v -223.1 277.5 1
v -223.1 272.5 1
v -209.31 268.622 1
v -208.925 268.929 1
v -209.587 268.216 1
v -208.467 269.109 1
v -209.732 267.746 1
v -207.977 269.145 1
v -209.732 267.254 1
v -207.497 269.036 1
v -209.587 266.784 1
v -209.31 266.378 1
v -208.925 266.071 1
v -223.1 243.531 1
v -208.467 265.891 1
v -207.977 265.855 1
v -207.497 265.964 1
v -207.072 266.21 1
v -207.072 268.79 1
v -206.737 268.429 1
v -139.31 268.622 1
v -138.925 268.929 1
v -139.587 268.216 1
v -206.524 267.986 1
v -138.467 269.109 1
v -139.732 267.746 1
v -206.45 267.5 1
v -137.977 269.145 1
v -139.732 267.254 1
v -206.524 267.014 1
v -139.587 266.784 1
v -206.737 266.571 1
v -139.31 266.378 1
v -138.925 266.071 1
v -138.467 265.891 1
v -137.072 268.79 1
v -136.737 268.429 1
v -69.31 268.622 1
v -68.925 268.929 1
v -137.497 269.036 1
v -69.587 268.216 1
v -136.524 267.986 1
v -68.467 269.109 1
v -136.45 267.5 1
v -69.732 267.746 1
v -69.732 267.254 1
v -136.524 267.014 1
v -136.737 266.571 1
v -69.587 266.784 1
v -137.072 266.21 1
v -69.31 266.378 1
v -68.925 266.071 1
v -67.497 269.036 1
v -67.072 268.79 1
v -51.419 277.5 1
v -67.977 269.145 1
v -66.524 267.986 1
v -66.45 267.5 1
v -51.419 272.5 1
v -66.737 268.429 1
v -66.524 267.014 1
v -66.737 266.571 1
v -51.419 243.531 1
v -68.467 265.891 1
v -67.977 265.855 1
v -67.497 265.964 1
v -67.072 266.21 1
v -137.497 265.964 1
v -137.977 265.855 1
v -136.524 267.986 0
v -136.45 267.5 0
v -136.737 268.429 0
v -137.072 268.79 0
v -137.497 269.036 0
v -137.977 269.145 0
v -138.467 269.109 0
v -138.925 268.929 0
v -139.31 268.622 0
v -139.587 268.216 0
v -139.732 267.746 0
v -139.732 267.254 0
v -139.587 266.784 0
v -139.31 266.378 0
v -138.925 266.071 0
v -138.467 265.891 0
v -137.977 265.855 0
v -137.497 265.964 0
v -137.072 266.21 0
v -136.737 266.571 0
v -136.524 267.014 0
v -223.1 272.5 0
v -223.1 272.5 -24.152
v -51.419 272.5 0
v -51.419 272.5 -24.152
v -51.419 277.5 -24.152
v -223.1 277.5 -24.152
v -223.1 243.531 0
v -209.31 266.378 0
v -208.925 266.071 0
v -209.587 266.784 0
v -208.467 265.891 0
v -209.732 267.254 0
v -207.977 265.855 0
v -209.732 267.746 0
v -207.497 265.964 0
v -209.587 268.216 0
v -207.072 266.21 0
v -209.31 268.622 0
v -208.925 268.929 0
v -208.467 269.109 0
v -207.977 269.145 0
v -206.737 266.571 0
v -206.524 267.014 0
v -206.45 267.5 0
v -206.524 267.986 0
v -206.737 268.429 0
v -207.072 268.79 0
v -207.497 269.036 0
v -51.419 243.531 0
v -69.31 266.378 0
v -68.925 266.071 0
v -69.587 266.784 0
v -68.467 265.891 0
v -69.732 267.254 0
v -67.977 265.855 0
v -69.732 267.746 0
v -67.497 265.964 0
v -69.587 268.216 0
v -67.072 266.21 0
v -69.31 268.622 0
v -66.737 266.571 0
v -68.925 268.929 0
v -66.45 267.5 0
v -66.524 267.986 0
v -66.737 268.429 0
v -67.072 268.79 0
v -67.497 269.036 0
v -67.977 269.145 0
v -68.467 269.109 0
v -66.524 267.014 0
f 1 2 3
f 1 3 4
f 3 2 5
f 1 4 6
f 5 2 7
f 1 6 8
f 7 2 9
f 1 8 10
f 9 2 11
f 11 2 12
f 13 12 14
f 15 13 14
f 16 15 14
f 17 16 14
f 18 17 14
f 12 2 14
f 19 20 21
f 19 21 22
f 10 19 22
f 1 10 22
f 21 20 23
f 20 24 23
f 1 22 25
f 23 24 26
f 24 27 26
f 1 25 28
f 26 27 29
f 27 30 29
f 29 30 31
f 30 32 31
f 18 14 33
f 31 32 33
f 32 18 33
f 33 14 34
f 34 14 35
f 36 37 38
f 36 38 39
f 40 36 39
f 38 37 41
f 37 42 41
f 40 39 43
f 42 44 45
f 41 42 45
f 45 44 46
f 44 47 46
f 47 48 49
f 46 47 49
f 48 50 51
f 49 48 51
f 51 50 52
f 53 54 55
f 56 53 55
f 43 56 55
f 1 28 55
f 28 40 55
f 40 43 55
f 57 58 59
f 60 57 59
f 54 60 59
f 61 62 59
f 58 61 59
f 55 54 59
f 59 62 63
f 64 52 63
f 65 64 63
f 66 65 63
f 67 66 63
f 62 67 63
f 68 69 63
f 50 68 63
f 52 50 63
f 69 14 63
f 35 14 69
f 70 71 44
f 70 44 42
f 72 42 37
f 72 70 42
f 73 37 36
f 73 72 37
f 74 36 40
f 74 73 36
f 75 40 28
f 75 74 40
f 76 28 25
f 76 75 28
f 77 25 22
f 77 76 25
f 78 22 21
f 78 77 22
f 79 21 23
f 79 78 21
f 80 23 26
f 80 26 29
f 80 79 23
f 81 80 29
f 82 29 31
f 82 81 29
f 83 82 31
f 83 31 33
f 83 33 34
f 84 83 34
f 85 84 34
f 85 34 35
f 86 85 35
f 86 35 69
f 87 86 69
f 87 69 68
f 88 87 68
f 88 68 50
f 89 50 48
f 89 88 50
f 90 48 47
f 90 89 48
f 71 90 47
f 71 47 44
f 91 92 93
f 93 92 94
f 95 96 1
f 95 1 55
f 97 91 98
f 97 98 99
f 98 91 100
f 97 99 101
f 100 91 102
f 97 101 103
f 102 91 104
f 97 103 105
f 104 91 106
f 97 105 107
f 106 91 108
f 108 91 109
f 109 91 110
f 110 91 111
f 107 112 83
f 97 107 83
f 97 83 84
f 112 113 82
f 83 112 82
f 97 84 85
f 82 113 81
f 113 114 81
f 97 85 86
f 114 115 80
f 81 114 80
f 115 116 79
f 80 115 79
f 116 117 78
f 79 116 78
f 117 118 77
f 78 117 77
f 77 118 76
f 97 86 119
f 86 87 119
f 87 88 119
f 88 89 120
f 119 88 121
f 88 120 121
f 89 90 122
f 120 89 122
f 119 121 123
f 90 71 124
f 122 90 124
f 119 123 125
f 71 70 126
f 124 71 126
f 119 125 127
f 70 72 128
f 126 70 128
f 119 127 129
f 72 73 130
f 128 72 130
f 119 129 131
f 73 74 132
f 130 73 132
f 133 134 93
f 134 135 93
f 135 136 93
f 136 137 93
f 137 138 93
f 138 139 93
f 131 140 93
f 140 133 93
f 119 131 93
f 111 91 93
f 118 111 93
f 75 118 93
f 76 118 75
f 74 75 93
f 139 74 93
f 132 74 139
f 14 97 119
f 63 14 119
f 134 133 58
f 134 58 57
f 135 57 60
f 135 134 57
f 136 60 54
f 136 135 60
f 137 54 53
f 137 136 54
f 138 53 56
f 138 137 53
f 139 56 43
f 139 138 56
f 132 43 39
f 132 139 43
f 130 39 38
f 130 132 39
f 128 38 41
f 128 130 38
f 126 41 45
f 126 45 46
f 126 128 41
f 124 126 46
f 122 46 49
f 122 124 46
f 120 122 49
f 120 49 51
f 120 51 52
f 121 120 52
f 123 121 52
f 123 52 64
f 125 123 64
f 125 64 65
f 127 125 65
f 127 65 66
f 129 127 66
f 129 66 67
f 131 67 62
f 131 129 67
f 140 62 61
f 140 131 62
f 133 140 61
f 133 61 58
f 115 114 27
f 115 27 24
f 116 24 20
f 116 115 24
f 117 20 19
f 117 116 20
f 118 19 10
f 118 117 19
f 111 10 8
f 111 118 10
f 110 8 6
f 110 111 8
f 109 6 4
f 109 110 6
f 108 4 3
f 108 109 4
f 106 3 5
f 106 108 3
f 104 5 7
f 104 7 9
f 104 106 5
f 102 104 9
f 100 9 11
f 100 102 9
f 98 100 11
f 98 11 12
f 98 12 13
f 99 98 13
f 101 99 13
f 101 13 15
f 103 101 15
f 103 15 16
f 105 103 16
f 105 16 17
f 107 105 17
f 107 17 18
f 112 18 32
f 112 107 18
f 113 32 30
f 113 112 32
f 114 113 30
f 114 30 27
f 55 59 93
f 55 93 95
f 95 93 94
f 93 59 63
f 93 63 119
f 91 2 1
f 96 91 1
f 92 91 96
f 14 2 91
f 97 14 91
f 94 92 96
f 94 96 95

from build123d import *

# Parameters (mm, degrees)
SKETCH1_W           = 171.681197847
SKETCH1_H           = 28.969428325
SKETCH1_R           = 1.65
BOSS_EXTRUDE1_DEPTH = 1
SKETCH7_W           = 171.681197847
SKETCH7_H           = 25.151518983
BOSS_EXTRUDE2_DEPTH = 5


with BuildPart() as part:
    # Sketch1 → Boss-Extrude1 (new body)
    with BuildSketch(Plane.XY):
        with Locations((-137.259678888, 258.015285838)):
            Rectangle(SKETCH1_W, SKETCH1_H)
        with Locations((-208.100277812, 267.5)):
            Circle(SKETCH1_R, mode=Mode.SUBTRACT)
        with Locations((-138.100277812, 267.5)):
            Circle(SKETCH1_R, mode=Mode.SUBTRACT)
        with Locations((-68.100277811, 267.5)):
            Circle(SKETCH1_R, mode=Mode.SUBTRACT)
    extrude(amount=BOSS_EXTRUDE1_DEPTH)

    # Sketch7 → Boss-Extrude2 (add)
    with BuildSketch(Plane(origin=(0, 272.5, 0), x_dir=(1, 0, 0), z_dir=(0, 1, 0))):
        with Locations((-137.259678888, 11.575759492)):
            Rectangle(SKETCH7_W, SKETCH7_H)
    extrude(amount=BOSS_EXTRUDE2_DEPTH)


solid = part.part
